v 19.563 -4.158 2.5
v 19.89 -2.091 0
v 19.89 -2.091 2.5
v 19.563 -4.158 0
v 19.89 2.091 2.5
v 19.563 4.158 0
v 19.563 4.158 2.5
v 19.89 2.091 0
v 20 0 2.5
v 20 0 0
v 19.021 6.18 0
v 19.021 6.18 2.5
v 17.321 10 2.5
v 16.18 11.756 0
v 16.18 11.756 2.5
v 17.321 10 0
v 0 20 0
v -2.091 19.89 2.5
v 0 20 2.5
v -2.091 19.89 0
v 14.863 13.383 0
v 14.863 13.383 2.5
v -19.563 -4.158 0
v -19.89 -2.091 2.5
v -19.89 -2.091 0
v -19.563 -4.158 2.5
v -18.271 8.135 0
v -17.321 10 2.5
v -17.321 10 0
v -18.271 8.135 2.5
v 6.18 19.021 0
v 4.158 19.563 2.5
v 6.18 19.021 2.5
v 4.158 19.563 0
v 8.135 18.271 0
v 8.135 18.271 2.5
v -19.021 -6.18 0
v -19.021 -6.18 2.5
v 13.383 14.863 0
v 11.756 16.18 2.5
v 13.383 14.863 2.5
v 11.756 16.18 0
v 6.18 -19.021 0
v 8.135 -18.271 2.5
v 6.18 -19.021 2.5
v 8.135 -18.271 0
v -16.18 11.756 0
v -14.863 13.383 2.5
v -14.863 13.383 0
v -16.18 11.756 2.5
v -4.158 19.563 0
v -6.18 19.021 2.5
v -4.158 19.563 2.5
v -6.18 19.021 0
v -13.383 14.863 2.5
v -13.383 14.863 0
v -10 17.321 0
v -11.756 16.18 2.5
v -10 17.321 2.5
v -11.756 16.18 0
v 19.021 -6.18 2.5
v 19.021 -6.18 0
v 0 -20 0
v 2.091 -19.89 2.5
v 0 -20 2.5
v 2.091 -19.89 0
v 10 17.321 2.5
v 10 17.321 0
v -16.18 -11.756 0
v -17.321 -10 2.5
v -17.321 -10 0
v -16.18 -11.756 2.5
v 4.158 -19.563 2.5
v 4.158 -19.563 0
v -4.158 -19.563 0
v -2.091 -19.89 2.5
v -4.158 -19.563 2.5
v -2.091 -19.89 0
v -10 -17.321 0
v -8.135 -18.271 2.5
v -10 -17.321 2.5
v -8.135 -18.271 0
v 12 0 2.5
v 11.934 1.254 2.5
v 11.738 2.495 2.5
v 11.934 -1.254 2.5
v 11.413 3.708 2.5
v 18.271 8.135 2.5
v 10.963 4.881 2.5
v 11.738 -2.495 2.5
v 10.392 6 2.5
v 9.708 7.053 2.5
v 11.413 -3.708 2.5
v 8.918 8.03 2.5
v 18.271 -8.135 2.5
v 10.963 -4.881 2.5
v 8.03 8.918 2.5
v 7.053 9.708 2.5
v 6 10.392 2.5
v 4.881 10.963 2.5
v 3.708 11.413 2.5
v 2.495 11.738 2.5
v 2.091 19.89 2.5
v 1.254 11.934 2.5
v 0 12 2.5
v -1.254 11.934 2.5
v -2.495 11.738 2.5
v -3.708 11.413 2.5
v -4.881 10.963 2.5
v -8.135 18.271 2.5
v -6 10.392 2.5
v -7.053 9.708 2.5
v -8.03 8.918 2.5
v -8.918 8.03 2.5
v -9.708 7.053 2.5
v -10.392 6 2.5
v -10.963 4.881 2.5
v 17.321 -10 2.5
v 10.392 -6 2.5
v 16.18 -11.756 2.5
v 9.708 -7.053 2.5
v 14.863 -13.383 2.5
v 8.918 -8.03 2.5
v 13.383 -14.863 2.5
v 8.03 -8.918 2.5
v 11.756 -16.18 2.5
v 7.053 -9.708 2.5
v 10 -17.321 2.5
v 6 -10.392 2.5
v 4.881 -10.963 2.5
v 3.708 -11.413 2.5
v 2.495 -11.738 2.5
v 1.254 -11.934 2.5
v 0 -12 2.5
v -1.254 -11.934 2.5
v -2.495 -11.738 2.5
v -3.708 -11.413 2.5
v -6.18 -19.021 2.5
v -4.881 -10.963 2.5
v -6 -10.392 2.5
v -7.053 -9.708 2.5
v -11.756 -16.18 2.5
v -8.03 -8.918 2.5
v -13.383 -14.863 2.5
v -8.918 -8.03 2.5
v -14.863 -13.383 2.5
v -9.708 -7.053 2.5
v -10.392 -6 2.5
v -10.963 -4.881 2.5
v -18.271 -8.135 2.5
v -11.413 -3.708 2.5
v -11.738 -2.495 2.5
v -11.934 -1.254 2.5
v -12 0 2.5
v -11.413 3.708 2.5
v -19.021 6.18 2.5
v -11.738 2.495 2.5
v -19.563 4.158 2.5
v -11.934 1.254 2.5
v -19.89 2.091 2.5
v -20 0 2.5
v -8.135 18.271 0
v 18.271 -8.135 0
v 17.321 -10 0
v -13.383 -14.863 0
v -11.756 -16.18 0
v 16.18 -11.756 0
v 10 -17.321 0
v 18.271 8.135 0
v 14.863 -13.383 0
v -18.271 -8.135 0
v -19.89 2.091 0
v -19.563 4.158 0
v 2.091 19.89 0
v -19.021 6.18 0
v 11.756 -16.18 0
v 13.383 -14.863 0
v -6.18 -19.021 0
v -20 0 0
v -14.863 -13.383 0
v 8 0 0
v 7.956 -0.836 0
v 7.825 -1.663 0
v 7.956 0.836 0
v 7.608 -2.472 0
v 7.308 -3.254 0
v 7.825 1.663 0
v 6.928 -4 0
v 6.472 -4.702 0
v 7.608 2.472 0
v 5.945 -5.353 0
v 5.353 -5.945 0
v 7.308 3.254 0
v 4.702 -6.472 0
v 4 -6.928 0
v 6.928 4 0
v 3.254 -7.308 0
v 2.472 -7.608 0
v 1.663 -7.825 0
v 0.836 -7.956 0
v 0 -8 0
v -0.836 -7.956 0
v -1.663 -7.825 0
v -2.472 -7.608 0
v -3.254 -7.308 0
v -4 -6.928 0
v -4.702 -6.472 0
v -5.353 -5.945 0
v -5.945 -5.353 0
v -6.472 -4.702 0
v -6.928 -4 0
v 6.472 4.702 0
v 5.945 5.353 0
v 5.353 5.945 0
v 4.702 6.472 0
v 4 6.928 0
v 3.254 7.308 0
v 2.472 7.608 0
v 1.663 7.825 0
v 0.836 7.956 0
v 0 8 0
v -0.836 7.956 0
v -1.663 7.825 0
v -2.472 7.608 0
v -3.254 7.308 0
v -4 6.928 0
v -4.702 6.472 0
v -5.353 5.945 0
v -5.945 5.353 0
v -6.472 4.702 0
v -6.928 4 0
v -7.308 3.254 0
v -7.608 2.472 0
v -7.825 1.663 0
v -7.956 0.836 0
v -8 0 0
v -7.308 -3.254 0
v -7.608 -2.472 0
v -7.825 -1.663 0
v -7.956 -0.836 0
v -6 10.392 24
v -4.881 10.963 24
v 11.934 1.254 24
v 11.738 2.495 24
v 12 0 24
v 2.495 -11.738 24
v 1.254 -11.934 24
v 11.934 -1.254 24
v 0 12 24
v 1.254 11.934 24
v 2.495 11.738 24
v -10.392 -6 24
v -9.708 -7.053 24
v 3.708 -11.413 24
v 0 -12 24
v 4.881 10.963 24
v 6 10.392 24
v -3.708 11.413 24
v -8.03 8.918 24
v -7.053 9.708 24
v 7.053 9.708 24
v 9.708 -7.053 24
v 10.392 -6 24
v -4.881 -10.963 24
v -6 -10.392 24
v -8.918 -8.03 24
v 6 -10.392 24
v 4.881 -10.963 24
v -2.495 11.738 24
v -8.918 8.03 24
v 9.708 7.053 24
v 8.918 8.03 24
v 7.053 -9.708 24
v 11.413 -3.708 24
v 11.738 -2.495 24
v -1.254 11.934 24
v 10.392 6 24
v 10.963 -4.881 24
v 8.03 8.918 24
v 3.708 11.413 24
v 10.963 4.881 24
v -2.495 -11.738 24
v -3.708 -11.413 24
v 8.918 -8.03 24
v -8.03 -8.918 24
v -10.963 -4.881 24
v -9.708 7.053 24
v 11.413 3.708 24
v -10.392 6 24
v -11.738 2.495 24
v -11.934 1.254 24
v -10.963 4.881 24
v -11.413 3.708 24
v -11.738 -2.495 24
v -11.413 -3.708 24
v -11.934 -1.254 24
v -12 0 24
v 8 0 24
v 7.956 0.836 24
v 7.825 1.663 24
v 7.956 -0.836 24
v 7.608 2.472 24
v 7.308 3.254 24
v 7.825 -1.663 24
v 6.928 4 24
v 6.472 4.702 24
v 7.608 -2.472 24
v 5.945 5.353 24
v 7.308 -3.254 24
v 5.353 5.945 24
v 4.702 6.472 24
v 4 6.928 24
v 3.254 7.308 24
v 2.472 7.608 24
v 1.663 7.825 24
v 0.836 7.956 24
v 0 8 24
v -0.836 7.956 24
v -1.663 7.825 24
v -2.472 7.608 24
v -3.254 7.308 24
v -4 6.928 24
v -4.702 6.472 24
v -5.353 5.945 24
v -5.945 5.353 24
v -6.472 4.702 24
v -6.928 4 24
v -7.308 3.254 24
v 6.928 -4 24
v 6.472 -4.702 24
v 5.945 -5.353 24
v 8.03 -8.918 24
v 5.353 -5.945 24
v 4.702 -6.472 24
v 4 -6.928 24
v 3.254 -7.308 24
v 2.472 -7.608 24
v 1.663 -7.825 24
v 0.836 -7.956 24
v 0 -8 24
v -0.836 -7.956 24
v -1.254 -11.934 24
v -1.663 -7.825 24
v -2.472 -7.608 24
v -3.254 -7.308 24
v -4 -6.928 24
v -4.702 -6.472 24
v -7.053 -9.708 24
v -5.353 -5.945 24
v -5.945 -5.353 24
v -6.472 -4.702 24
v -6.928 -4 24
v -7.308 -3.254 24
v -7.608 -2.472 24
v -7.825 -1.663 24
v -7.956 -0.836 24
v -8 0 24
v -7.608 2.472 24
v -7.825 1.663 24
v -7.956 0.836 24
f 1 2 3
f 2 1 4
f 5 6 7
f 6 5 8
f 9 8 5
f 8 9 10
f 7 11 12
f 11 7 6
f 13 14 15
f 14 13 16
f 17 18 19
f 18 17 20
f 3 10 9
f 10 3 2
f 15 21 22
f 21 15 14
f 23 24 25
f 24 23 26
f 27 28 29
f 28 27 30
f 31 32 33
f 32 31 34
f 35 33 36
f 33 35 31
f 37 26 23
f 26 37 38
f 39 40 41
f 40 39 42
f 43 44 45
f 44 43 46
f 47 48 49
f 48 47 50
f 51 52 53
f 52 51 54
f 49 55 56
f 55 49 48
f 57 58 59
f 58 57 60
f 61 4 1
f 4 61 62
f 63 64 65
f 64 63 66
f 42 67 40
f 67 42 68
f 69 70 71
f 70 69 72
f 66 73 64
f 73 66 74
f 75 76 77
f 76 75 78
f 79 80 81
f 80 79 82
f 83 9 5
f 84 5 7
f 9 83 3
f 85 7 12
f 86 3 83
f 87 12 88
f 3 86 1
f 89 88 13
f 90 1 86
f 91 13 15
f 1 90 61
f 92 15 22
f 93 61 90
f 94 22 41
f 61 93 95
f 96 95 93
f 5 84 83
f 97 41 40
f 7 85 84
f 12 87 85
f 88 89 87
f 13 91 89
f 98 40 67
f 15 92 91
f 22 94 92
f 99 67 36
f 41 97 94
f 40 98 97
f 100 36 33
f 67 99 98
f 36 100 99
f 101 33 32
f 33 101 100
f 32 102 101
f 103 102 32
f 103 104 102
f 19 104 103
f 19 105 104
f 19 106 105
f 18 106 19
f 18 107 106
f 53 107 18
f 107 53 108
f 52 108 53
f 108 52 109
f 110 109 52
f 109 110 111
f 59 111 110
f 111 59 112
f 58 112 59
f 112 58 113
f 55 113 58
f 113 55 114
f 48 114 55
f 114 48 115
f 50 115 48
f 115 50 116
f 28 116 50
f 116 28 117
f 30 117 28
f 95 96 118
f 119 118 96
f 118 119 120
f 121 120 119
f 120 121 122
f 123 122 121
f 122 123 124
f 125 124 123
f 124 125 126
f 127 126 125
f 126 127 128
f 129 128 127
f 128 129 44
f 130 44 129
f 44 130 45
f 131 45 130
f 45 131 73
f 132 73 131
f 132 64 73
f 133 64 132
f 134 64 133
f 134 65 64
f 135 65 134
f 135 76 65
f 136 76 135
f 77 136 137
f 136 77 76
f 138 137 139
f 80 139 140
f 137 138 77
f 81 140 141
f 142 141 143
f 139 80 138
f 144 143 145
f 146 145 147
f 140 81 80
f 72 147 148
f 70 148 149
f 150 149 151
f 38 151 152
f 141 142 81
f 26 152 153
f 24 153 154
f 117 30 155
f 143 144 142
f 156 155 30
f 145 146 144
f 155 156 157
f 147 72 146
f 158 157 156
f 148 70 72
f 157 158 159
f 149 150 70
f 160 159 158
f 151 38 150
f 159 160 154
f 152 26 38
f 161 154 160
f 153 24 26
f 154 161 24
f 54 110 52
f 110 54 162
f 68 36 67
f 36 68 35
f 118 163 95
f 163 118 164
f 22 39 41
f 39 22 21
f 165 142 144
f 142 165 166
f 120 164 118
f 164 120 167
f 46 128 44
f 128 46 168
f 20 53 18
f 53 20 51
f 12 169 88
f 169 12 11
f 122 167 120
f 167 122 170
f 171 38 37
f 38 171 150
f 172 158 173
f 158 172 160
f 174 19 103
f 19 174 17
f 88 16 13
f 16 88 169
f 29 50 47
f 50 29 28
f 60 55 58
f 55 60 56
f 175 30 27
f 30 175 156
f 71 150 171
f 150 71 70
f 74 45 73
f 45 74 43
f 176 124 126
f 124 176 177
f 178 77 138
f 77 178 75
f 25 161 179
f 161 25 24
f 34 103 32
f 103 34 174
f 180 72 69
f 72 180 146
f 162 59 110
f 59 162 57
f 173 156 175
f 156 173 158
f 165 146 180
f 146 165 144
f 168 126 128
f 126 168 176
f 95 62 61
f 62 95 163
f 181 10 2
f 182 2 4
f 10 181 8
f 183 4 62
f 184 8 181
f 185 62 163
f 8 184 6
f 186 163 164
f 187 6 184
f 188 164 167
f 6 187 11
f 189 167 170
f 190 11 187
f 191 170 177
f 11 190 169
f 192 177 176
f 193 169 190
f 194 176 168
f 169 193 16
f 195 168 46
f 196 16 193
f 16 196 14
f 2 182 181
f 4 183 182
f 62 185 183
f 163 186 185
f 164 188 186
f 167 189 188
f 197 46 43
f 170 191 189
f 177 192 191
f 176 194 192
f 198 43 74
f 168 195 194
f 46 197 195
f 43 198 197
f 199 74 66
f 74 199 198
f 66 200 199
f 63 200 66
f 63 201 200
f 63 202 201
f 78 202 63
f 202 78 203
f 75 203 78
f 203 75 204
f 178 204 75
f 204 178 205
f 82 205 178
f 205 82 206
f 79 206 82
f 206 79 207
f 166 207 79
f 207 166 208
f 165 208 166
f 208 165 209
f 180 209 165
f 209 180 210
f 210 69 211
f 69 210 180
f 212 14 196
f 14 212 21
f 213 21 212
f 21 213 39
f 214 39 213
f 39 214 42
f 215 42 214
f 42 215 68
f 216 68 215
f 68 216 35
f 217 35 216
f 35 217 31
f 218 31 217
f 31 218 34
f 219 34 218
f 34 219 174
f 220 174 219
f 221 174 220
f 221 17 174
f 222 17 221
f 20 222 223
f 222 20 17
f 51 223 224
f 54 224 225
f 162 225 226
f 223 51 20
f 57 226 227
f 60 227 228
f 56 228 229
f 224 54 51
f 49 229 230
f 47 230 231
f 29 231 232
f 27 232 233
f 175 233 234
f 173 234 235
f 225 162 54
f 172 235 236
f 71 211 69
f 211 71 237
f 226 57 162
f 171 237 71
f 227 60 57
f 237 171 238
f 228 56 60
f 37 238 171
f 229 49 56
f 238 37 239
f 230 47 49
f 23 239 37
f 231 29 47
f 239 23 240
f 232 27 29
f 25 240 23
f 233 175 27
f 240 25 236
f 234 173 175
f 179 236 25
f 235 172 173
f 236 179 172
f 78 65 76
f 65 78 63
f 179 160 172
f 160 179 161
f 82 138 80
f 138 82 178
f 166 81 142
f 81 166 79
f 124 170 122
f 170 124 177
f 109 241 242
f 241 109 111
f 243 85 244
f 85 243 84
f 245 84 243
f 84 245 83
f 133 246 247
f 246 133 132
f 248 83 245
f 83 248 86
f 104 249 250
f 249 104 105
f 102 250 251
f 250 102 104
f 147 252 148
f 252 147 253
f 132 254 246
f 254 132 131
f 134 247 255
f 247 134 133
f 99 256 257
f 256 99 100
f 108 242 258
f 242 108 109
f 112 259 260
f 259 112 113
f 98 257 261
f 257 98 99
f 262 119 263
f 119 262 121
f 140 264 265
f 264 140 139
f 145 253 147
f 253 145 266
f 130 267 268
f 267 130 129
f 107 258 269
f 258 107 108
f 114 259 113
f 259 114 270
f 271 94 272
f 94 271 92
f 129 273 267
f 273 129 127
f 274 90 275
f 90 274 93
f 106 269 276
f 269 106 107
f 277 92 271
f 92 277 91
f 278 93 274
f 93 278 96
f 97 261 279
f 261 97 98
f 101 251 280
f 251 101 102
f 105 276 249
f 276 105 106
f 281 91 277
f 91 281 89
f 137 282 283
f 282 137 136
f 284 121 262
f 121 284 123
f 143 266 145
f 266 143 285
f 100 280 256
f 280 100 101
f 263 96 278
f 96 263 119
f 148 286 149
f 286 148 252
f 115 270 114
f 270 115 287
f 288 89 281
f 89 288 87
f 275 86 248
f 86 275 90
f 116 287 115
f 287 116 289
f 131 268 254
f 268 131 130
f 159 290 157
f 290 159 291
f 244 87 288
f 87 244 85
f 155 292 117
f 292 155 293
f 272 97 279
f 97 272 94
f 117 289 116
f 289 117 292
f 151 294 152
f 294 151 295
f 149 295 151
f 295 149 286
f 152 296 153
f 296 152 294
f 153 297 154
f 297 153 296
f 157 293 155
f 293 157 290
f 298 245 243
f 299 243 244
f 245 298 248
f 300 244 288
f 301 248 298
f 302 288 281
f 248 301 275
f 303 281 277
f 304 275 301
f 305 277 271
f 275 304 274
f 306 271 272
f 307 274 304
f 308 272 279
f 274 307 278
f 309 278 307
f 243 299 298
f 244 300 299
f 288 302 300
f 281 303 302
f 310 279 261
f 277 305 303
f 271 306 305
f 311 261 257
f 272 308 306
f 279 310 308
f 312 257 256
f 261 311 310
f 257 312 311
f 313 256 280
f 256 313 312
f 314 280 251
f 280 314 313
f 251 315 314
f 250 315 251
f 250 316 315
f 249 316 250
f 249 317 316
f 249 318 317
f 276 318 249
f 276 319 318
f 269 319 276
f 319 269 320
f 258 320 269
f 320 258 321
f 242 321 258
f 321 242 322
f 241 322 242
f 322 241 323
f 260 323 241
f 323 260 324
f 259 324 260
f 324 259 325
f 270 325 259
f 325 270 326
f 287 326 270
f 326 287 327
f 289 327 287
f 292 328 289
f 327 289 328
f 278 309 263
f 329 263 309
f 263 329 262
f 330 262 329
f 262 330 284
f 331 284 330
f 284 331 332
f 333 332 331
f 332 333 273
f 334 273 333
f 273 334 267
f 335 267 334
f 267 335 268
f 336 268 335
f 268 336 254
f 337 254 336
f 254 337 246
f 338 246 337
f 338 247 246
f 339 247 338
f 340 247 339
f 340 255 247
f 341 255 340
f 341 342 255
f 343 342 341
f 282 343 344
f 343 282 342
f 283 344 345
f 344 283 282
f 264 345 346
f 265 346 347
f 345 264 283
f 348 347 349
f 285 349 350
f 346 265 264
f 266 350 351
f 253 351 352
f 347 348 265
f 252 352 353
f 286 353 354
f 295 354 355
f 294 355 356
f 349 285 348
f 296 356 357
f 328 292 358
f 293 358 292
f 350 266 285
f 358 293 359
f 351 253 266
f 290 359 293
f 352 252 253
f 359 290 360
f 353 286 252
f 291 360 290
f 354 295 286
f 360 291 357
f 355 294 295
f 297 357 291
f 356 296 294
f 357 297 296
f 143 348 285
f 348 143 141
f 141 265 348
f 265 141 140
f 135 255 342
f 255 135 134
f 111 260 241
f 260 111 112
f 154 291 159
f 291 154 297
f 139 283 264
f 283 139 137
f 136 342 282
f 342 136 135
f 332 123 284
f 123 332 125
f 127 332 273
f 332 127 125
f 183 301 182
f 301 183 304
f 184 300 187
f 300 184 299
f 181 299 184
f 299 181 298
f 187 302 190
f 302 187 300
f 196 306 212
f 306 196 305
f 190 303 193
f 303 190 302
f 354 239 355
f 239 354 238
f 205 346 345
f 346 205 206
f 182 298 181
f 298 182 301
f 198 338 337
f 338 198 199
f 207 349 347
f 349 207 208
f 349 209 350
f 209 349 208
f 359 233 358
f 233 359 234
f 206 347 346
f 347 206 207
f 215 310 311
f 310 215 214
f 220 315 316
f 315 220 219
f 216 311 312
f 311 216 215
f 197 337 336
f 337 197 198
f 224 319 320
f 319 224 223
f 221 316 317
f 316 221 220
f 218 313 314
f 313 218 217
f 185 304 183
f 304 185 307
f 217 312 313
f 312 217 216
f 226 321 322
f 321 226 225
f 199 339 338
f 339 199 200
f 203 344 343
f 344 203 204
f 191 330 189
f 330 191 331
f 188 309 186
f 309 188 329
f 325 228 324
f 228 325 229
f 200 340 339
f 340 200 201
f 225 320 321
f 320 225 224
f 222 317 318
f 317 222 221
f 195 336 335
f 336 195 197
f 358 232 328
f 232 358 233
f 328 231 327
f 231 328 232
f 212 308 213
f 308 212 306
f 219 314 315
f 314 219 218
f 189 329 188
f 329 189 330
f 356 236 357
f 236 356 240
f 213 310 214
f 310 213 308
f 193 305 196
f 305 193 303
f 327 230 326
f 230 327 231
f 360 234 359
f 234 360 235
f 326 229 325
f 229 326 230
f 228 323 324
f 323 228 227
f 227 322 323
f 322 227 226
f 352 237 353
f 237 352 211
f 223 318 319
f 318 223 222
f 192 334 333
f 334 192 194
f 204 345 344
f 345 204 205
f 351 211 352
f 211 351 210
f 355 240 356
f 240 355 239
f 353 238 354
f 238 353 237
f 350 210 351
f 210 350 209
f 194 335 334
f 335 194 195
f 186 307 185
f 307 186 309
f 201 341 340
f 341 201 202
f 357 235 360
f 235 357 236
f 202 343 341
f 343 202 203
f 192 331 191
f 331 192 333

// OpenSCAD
// Flanged sleeve bushing.
$fn = 60;
eps = 0.02;
inner_d = 16;
outer_d = 24;
length = 24;
flange_d = 40;
flange_t = 2.5;
difference() {
    union() {
        cylinder(d = flange_d, h = flange_t);
        cylinder(d = outer_d, h = length);
    }
    translate([0, 0, -eps]) cylinder(d = inner_d, h = length + 2 * eps);
}
